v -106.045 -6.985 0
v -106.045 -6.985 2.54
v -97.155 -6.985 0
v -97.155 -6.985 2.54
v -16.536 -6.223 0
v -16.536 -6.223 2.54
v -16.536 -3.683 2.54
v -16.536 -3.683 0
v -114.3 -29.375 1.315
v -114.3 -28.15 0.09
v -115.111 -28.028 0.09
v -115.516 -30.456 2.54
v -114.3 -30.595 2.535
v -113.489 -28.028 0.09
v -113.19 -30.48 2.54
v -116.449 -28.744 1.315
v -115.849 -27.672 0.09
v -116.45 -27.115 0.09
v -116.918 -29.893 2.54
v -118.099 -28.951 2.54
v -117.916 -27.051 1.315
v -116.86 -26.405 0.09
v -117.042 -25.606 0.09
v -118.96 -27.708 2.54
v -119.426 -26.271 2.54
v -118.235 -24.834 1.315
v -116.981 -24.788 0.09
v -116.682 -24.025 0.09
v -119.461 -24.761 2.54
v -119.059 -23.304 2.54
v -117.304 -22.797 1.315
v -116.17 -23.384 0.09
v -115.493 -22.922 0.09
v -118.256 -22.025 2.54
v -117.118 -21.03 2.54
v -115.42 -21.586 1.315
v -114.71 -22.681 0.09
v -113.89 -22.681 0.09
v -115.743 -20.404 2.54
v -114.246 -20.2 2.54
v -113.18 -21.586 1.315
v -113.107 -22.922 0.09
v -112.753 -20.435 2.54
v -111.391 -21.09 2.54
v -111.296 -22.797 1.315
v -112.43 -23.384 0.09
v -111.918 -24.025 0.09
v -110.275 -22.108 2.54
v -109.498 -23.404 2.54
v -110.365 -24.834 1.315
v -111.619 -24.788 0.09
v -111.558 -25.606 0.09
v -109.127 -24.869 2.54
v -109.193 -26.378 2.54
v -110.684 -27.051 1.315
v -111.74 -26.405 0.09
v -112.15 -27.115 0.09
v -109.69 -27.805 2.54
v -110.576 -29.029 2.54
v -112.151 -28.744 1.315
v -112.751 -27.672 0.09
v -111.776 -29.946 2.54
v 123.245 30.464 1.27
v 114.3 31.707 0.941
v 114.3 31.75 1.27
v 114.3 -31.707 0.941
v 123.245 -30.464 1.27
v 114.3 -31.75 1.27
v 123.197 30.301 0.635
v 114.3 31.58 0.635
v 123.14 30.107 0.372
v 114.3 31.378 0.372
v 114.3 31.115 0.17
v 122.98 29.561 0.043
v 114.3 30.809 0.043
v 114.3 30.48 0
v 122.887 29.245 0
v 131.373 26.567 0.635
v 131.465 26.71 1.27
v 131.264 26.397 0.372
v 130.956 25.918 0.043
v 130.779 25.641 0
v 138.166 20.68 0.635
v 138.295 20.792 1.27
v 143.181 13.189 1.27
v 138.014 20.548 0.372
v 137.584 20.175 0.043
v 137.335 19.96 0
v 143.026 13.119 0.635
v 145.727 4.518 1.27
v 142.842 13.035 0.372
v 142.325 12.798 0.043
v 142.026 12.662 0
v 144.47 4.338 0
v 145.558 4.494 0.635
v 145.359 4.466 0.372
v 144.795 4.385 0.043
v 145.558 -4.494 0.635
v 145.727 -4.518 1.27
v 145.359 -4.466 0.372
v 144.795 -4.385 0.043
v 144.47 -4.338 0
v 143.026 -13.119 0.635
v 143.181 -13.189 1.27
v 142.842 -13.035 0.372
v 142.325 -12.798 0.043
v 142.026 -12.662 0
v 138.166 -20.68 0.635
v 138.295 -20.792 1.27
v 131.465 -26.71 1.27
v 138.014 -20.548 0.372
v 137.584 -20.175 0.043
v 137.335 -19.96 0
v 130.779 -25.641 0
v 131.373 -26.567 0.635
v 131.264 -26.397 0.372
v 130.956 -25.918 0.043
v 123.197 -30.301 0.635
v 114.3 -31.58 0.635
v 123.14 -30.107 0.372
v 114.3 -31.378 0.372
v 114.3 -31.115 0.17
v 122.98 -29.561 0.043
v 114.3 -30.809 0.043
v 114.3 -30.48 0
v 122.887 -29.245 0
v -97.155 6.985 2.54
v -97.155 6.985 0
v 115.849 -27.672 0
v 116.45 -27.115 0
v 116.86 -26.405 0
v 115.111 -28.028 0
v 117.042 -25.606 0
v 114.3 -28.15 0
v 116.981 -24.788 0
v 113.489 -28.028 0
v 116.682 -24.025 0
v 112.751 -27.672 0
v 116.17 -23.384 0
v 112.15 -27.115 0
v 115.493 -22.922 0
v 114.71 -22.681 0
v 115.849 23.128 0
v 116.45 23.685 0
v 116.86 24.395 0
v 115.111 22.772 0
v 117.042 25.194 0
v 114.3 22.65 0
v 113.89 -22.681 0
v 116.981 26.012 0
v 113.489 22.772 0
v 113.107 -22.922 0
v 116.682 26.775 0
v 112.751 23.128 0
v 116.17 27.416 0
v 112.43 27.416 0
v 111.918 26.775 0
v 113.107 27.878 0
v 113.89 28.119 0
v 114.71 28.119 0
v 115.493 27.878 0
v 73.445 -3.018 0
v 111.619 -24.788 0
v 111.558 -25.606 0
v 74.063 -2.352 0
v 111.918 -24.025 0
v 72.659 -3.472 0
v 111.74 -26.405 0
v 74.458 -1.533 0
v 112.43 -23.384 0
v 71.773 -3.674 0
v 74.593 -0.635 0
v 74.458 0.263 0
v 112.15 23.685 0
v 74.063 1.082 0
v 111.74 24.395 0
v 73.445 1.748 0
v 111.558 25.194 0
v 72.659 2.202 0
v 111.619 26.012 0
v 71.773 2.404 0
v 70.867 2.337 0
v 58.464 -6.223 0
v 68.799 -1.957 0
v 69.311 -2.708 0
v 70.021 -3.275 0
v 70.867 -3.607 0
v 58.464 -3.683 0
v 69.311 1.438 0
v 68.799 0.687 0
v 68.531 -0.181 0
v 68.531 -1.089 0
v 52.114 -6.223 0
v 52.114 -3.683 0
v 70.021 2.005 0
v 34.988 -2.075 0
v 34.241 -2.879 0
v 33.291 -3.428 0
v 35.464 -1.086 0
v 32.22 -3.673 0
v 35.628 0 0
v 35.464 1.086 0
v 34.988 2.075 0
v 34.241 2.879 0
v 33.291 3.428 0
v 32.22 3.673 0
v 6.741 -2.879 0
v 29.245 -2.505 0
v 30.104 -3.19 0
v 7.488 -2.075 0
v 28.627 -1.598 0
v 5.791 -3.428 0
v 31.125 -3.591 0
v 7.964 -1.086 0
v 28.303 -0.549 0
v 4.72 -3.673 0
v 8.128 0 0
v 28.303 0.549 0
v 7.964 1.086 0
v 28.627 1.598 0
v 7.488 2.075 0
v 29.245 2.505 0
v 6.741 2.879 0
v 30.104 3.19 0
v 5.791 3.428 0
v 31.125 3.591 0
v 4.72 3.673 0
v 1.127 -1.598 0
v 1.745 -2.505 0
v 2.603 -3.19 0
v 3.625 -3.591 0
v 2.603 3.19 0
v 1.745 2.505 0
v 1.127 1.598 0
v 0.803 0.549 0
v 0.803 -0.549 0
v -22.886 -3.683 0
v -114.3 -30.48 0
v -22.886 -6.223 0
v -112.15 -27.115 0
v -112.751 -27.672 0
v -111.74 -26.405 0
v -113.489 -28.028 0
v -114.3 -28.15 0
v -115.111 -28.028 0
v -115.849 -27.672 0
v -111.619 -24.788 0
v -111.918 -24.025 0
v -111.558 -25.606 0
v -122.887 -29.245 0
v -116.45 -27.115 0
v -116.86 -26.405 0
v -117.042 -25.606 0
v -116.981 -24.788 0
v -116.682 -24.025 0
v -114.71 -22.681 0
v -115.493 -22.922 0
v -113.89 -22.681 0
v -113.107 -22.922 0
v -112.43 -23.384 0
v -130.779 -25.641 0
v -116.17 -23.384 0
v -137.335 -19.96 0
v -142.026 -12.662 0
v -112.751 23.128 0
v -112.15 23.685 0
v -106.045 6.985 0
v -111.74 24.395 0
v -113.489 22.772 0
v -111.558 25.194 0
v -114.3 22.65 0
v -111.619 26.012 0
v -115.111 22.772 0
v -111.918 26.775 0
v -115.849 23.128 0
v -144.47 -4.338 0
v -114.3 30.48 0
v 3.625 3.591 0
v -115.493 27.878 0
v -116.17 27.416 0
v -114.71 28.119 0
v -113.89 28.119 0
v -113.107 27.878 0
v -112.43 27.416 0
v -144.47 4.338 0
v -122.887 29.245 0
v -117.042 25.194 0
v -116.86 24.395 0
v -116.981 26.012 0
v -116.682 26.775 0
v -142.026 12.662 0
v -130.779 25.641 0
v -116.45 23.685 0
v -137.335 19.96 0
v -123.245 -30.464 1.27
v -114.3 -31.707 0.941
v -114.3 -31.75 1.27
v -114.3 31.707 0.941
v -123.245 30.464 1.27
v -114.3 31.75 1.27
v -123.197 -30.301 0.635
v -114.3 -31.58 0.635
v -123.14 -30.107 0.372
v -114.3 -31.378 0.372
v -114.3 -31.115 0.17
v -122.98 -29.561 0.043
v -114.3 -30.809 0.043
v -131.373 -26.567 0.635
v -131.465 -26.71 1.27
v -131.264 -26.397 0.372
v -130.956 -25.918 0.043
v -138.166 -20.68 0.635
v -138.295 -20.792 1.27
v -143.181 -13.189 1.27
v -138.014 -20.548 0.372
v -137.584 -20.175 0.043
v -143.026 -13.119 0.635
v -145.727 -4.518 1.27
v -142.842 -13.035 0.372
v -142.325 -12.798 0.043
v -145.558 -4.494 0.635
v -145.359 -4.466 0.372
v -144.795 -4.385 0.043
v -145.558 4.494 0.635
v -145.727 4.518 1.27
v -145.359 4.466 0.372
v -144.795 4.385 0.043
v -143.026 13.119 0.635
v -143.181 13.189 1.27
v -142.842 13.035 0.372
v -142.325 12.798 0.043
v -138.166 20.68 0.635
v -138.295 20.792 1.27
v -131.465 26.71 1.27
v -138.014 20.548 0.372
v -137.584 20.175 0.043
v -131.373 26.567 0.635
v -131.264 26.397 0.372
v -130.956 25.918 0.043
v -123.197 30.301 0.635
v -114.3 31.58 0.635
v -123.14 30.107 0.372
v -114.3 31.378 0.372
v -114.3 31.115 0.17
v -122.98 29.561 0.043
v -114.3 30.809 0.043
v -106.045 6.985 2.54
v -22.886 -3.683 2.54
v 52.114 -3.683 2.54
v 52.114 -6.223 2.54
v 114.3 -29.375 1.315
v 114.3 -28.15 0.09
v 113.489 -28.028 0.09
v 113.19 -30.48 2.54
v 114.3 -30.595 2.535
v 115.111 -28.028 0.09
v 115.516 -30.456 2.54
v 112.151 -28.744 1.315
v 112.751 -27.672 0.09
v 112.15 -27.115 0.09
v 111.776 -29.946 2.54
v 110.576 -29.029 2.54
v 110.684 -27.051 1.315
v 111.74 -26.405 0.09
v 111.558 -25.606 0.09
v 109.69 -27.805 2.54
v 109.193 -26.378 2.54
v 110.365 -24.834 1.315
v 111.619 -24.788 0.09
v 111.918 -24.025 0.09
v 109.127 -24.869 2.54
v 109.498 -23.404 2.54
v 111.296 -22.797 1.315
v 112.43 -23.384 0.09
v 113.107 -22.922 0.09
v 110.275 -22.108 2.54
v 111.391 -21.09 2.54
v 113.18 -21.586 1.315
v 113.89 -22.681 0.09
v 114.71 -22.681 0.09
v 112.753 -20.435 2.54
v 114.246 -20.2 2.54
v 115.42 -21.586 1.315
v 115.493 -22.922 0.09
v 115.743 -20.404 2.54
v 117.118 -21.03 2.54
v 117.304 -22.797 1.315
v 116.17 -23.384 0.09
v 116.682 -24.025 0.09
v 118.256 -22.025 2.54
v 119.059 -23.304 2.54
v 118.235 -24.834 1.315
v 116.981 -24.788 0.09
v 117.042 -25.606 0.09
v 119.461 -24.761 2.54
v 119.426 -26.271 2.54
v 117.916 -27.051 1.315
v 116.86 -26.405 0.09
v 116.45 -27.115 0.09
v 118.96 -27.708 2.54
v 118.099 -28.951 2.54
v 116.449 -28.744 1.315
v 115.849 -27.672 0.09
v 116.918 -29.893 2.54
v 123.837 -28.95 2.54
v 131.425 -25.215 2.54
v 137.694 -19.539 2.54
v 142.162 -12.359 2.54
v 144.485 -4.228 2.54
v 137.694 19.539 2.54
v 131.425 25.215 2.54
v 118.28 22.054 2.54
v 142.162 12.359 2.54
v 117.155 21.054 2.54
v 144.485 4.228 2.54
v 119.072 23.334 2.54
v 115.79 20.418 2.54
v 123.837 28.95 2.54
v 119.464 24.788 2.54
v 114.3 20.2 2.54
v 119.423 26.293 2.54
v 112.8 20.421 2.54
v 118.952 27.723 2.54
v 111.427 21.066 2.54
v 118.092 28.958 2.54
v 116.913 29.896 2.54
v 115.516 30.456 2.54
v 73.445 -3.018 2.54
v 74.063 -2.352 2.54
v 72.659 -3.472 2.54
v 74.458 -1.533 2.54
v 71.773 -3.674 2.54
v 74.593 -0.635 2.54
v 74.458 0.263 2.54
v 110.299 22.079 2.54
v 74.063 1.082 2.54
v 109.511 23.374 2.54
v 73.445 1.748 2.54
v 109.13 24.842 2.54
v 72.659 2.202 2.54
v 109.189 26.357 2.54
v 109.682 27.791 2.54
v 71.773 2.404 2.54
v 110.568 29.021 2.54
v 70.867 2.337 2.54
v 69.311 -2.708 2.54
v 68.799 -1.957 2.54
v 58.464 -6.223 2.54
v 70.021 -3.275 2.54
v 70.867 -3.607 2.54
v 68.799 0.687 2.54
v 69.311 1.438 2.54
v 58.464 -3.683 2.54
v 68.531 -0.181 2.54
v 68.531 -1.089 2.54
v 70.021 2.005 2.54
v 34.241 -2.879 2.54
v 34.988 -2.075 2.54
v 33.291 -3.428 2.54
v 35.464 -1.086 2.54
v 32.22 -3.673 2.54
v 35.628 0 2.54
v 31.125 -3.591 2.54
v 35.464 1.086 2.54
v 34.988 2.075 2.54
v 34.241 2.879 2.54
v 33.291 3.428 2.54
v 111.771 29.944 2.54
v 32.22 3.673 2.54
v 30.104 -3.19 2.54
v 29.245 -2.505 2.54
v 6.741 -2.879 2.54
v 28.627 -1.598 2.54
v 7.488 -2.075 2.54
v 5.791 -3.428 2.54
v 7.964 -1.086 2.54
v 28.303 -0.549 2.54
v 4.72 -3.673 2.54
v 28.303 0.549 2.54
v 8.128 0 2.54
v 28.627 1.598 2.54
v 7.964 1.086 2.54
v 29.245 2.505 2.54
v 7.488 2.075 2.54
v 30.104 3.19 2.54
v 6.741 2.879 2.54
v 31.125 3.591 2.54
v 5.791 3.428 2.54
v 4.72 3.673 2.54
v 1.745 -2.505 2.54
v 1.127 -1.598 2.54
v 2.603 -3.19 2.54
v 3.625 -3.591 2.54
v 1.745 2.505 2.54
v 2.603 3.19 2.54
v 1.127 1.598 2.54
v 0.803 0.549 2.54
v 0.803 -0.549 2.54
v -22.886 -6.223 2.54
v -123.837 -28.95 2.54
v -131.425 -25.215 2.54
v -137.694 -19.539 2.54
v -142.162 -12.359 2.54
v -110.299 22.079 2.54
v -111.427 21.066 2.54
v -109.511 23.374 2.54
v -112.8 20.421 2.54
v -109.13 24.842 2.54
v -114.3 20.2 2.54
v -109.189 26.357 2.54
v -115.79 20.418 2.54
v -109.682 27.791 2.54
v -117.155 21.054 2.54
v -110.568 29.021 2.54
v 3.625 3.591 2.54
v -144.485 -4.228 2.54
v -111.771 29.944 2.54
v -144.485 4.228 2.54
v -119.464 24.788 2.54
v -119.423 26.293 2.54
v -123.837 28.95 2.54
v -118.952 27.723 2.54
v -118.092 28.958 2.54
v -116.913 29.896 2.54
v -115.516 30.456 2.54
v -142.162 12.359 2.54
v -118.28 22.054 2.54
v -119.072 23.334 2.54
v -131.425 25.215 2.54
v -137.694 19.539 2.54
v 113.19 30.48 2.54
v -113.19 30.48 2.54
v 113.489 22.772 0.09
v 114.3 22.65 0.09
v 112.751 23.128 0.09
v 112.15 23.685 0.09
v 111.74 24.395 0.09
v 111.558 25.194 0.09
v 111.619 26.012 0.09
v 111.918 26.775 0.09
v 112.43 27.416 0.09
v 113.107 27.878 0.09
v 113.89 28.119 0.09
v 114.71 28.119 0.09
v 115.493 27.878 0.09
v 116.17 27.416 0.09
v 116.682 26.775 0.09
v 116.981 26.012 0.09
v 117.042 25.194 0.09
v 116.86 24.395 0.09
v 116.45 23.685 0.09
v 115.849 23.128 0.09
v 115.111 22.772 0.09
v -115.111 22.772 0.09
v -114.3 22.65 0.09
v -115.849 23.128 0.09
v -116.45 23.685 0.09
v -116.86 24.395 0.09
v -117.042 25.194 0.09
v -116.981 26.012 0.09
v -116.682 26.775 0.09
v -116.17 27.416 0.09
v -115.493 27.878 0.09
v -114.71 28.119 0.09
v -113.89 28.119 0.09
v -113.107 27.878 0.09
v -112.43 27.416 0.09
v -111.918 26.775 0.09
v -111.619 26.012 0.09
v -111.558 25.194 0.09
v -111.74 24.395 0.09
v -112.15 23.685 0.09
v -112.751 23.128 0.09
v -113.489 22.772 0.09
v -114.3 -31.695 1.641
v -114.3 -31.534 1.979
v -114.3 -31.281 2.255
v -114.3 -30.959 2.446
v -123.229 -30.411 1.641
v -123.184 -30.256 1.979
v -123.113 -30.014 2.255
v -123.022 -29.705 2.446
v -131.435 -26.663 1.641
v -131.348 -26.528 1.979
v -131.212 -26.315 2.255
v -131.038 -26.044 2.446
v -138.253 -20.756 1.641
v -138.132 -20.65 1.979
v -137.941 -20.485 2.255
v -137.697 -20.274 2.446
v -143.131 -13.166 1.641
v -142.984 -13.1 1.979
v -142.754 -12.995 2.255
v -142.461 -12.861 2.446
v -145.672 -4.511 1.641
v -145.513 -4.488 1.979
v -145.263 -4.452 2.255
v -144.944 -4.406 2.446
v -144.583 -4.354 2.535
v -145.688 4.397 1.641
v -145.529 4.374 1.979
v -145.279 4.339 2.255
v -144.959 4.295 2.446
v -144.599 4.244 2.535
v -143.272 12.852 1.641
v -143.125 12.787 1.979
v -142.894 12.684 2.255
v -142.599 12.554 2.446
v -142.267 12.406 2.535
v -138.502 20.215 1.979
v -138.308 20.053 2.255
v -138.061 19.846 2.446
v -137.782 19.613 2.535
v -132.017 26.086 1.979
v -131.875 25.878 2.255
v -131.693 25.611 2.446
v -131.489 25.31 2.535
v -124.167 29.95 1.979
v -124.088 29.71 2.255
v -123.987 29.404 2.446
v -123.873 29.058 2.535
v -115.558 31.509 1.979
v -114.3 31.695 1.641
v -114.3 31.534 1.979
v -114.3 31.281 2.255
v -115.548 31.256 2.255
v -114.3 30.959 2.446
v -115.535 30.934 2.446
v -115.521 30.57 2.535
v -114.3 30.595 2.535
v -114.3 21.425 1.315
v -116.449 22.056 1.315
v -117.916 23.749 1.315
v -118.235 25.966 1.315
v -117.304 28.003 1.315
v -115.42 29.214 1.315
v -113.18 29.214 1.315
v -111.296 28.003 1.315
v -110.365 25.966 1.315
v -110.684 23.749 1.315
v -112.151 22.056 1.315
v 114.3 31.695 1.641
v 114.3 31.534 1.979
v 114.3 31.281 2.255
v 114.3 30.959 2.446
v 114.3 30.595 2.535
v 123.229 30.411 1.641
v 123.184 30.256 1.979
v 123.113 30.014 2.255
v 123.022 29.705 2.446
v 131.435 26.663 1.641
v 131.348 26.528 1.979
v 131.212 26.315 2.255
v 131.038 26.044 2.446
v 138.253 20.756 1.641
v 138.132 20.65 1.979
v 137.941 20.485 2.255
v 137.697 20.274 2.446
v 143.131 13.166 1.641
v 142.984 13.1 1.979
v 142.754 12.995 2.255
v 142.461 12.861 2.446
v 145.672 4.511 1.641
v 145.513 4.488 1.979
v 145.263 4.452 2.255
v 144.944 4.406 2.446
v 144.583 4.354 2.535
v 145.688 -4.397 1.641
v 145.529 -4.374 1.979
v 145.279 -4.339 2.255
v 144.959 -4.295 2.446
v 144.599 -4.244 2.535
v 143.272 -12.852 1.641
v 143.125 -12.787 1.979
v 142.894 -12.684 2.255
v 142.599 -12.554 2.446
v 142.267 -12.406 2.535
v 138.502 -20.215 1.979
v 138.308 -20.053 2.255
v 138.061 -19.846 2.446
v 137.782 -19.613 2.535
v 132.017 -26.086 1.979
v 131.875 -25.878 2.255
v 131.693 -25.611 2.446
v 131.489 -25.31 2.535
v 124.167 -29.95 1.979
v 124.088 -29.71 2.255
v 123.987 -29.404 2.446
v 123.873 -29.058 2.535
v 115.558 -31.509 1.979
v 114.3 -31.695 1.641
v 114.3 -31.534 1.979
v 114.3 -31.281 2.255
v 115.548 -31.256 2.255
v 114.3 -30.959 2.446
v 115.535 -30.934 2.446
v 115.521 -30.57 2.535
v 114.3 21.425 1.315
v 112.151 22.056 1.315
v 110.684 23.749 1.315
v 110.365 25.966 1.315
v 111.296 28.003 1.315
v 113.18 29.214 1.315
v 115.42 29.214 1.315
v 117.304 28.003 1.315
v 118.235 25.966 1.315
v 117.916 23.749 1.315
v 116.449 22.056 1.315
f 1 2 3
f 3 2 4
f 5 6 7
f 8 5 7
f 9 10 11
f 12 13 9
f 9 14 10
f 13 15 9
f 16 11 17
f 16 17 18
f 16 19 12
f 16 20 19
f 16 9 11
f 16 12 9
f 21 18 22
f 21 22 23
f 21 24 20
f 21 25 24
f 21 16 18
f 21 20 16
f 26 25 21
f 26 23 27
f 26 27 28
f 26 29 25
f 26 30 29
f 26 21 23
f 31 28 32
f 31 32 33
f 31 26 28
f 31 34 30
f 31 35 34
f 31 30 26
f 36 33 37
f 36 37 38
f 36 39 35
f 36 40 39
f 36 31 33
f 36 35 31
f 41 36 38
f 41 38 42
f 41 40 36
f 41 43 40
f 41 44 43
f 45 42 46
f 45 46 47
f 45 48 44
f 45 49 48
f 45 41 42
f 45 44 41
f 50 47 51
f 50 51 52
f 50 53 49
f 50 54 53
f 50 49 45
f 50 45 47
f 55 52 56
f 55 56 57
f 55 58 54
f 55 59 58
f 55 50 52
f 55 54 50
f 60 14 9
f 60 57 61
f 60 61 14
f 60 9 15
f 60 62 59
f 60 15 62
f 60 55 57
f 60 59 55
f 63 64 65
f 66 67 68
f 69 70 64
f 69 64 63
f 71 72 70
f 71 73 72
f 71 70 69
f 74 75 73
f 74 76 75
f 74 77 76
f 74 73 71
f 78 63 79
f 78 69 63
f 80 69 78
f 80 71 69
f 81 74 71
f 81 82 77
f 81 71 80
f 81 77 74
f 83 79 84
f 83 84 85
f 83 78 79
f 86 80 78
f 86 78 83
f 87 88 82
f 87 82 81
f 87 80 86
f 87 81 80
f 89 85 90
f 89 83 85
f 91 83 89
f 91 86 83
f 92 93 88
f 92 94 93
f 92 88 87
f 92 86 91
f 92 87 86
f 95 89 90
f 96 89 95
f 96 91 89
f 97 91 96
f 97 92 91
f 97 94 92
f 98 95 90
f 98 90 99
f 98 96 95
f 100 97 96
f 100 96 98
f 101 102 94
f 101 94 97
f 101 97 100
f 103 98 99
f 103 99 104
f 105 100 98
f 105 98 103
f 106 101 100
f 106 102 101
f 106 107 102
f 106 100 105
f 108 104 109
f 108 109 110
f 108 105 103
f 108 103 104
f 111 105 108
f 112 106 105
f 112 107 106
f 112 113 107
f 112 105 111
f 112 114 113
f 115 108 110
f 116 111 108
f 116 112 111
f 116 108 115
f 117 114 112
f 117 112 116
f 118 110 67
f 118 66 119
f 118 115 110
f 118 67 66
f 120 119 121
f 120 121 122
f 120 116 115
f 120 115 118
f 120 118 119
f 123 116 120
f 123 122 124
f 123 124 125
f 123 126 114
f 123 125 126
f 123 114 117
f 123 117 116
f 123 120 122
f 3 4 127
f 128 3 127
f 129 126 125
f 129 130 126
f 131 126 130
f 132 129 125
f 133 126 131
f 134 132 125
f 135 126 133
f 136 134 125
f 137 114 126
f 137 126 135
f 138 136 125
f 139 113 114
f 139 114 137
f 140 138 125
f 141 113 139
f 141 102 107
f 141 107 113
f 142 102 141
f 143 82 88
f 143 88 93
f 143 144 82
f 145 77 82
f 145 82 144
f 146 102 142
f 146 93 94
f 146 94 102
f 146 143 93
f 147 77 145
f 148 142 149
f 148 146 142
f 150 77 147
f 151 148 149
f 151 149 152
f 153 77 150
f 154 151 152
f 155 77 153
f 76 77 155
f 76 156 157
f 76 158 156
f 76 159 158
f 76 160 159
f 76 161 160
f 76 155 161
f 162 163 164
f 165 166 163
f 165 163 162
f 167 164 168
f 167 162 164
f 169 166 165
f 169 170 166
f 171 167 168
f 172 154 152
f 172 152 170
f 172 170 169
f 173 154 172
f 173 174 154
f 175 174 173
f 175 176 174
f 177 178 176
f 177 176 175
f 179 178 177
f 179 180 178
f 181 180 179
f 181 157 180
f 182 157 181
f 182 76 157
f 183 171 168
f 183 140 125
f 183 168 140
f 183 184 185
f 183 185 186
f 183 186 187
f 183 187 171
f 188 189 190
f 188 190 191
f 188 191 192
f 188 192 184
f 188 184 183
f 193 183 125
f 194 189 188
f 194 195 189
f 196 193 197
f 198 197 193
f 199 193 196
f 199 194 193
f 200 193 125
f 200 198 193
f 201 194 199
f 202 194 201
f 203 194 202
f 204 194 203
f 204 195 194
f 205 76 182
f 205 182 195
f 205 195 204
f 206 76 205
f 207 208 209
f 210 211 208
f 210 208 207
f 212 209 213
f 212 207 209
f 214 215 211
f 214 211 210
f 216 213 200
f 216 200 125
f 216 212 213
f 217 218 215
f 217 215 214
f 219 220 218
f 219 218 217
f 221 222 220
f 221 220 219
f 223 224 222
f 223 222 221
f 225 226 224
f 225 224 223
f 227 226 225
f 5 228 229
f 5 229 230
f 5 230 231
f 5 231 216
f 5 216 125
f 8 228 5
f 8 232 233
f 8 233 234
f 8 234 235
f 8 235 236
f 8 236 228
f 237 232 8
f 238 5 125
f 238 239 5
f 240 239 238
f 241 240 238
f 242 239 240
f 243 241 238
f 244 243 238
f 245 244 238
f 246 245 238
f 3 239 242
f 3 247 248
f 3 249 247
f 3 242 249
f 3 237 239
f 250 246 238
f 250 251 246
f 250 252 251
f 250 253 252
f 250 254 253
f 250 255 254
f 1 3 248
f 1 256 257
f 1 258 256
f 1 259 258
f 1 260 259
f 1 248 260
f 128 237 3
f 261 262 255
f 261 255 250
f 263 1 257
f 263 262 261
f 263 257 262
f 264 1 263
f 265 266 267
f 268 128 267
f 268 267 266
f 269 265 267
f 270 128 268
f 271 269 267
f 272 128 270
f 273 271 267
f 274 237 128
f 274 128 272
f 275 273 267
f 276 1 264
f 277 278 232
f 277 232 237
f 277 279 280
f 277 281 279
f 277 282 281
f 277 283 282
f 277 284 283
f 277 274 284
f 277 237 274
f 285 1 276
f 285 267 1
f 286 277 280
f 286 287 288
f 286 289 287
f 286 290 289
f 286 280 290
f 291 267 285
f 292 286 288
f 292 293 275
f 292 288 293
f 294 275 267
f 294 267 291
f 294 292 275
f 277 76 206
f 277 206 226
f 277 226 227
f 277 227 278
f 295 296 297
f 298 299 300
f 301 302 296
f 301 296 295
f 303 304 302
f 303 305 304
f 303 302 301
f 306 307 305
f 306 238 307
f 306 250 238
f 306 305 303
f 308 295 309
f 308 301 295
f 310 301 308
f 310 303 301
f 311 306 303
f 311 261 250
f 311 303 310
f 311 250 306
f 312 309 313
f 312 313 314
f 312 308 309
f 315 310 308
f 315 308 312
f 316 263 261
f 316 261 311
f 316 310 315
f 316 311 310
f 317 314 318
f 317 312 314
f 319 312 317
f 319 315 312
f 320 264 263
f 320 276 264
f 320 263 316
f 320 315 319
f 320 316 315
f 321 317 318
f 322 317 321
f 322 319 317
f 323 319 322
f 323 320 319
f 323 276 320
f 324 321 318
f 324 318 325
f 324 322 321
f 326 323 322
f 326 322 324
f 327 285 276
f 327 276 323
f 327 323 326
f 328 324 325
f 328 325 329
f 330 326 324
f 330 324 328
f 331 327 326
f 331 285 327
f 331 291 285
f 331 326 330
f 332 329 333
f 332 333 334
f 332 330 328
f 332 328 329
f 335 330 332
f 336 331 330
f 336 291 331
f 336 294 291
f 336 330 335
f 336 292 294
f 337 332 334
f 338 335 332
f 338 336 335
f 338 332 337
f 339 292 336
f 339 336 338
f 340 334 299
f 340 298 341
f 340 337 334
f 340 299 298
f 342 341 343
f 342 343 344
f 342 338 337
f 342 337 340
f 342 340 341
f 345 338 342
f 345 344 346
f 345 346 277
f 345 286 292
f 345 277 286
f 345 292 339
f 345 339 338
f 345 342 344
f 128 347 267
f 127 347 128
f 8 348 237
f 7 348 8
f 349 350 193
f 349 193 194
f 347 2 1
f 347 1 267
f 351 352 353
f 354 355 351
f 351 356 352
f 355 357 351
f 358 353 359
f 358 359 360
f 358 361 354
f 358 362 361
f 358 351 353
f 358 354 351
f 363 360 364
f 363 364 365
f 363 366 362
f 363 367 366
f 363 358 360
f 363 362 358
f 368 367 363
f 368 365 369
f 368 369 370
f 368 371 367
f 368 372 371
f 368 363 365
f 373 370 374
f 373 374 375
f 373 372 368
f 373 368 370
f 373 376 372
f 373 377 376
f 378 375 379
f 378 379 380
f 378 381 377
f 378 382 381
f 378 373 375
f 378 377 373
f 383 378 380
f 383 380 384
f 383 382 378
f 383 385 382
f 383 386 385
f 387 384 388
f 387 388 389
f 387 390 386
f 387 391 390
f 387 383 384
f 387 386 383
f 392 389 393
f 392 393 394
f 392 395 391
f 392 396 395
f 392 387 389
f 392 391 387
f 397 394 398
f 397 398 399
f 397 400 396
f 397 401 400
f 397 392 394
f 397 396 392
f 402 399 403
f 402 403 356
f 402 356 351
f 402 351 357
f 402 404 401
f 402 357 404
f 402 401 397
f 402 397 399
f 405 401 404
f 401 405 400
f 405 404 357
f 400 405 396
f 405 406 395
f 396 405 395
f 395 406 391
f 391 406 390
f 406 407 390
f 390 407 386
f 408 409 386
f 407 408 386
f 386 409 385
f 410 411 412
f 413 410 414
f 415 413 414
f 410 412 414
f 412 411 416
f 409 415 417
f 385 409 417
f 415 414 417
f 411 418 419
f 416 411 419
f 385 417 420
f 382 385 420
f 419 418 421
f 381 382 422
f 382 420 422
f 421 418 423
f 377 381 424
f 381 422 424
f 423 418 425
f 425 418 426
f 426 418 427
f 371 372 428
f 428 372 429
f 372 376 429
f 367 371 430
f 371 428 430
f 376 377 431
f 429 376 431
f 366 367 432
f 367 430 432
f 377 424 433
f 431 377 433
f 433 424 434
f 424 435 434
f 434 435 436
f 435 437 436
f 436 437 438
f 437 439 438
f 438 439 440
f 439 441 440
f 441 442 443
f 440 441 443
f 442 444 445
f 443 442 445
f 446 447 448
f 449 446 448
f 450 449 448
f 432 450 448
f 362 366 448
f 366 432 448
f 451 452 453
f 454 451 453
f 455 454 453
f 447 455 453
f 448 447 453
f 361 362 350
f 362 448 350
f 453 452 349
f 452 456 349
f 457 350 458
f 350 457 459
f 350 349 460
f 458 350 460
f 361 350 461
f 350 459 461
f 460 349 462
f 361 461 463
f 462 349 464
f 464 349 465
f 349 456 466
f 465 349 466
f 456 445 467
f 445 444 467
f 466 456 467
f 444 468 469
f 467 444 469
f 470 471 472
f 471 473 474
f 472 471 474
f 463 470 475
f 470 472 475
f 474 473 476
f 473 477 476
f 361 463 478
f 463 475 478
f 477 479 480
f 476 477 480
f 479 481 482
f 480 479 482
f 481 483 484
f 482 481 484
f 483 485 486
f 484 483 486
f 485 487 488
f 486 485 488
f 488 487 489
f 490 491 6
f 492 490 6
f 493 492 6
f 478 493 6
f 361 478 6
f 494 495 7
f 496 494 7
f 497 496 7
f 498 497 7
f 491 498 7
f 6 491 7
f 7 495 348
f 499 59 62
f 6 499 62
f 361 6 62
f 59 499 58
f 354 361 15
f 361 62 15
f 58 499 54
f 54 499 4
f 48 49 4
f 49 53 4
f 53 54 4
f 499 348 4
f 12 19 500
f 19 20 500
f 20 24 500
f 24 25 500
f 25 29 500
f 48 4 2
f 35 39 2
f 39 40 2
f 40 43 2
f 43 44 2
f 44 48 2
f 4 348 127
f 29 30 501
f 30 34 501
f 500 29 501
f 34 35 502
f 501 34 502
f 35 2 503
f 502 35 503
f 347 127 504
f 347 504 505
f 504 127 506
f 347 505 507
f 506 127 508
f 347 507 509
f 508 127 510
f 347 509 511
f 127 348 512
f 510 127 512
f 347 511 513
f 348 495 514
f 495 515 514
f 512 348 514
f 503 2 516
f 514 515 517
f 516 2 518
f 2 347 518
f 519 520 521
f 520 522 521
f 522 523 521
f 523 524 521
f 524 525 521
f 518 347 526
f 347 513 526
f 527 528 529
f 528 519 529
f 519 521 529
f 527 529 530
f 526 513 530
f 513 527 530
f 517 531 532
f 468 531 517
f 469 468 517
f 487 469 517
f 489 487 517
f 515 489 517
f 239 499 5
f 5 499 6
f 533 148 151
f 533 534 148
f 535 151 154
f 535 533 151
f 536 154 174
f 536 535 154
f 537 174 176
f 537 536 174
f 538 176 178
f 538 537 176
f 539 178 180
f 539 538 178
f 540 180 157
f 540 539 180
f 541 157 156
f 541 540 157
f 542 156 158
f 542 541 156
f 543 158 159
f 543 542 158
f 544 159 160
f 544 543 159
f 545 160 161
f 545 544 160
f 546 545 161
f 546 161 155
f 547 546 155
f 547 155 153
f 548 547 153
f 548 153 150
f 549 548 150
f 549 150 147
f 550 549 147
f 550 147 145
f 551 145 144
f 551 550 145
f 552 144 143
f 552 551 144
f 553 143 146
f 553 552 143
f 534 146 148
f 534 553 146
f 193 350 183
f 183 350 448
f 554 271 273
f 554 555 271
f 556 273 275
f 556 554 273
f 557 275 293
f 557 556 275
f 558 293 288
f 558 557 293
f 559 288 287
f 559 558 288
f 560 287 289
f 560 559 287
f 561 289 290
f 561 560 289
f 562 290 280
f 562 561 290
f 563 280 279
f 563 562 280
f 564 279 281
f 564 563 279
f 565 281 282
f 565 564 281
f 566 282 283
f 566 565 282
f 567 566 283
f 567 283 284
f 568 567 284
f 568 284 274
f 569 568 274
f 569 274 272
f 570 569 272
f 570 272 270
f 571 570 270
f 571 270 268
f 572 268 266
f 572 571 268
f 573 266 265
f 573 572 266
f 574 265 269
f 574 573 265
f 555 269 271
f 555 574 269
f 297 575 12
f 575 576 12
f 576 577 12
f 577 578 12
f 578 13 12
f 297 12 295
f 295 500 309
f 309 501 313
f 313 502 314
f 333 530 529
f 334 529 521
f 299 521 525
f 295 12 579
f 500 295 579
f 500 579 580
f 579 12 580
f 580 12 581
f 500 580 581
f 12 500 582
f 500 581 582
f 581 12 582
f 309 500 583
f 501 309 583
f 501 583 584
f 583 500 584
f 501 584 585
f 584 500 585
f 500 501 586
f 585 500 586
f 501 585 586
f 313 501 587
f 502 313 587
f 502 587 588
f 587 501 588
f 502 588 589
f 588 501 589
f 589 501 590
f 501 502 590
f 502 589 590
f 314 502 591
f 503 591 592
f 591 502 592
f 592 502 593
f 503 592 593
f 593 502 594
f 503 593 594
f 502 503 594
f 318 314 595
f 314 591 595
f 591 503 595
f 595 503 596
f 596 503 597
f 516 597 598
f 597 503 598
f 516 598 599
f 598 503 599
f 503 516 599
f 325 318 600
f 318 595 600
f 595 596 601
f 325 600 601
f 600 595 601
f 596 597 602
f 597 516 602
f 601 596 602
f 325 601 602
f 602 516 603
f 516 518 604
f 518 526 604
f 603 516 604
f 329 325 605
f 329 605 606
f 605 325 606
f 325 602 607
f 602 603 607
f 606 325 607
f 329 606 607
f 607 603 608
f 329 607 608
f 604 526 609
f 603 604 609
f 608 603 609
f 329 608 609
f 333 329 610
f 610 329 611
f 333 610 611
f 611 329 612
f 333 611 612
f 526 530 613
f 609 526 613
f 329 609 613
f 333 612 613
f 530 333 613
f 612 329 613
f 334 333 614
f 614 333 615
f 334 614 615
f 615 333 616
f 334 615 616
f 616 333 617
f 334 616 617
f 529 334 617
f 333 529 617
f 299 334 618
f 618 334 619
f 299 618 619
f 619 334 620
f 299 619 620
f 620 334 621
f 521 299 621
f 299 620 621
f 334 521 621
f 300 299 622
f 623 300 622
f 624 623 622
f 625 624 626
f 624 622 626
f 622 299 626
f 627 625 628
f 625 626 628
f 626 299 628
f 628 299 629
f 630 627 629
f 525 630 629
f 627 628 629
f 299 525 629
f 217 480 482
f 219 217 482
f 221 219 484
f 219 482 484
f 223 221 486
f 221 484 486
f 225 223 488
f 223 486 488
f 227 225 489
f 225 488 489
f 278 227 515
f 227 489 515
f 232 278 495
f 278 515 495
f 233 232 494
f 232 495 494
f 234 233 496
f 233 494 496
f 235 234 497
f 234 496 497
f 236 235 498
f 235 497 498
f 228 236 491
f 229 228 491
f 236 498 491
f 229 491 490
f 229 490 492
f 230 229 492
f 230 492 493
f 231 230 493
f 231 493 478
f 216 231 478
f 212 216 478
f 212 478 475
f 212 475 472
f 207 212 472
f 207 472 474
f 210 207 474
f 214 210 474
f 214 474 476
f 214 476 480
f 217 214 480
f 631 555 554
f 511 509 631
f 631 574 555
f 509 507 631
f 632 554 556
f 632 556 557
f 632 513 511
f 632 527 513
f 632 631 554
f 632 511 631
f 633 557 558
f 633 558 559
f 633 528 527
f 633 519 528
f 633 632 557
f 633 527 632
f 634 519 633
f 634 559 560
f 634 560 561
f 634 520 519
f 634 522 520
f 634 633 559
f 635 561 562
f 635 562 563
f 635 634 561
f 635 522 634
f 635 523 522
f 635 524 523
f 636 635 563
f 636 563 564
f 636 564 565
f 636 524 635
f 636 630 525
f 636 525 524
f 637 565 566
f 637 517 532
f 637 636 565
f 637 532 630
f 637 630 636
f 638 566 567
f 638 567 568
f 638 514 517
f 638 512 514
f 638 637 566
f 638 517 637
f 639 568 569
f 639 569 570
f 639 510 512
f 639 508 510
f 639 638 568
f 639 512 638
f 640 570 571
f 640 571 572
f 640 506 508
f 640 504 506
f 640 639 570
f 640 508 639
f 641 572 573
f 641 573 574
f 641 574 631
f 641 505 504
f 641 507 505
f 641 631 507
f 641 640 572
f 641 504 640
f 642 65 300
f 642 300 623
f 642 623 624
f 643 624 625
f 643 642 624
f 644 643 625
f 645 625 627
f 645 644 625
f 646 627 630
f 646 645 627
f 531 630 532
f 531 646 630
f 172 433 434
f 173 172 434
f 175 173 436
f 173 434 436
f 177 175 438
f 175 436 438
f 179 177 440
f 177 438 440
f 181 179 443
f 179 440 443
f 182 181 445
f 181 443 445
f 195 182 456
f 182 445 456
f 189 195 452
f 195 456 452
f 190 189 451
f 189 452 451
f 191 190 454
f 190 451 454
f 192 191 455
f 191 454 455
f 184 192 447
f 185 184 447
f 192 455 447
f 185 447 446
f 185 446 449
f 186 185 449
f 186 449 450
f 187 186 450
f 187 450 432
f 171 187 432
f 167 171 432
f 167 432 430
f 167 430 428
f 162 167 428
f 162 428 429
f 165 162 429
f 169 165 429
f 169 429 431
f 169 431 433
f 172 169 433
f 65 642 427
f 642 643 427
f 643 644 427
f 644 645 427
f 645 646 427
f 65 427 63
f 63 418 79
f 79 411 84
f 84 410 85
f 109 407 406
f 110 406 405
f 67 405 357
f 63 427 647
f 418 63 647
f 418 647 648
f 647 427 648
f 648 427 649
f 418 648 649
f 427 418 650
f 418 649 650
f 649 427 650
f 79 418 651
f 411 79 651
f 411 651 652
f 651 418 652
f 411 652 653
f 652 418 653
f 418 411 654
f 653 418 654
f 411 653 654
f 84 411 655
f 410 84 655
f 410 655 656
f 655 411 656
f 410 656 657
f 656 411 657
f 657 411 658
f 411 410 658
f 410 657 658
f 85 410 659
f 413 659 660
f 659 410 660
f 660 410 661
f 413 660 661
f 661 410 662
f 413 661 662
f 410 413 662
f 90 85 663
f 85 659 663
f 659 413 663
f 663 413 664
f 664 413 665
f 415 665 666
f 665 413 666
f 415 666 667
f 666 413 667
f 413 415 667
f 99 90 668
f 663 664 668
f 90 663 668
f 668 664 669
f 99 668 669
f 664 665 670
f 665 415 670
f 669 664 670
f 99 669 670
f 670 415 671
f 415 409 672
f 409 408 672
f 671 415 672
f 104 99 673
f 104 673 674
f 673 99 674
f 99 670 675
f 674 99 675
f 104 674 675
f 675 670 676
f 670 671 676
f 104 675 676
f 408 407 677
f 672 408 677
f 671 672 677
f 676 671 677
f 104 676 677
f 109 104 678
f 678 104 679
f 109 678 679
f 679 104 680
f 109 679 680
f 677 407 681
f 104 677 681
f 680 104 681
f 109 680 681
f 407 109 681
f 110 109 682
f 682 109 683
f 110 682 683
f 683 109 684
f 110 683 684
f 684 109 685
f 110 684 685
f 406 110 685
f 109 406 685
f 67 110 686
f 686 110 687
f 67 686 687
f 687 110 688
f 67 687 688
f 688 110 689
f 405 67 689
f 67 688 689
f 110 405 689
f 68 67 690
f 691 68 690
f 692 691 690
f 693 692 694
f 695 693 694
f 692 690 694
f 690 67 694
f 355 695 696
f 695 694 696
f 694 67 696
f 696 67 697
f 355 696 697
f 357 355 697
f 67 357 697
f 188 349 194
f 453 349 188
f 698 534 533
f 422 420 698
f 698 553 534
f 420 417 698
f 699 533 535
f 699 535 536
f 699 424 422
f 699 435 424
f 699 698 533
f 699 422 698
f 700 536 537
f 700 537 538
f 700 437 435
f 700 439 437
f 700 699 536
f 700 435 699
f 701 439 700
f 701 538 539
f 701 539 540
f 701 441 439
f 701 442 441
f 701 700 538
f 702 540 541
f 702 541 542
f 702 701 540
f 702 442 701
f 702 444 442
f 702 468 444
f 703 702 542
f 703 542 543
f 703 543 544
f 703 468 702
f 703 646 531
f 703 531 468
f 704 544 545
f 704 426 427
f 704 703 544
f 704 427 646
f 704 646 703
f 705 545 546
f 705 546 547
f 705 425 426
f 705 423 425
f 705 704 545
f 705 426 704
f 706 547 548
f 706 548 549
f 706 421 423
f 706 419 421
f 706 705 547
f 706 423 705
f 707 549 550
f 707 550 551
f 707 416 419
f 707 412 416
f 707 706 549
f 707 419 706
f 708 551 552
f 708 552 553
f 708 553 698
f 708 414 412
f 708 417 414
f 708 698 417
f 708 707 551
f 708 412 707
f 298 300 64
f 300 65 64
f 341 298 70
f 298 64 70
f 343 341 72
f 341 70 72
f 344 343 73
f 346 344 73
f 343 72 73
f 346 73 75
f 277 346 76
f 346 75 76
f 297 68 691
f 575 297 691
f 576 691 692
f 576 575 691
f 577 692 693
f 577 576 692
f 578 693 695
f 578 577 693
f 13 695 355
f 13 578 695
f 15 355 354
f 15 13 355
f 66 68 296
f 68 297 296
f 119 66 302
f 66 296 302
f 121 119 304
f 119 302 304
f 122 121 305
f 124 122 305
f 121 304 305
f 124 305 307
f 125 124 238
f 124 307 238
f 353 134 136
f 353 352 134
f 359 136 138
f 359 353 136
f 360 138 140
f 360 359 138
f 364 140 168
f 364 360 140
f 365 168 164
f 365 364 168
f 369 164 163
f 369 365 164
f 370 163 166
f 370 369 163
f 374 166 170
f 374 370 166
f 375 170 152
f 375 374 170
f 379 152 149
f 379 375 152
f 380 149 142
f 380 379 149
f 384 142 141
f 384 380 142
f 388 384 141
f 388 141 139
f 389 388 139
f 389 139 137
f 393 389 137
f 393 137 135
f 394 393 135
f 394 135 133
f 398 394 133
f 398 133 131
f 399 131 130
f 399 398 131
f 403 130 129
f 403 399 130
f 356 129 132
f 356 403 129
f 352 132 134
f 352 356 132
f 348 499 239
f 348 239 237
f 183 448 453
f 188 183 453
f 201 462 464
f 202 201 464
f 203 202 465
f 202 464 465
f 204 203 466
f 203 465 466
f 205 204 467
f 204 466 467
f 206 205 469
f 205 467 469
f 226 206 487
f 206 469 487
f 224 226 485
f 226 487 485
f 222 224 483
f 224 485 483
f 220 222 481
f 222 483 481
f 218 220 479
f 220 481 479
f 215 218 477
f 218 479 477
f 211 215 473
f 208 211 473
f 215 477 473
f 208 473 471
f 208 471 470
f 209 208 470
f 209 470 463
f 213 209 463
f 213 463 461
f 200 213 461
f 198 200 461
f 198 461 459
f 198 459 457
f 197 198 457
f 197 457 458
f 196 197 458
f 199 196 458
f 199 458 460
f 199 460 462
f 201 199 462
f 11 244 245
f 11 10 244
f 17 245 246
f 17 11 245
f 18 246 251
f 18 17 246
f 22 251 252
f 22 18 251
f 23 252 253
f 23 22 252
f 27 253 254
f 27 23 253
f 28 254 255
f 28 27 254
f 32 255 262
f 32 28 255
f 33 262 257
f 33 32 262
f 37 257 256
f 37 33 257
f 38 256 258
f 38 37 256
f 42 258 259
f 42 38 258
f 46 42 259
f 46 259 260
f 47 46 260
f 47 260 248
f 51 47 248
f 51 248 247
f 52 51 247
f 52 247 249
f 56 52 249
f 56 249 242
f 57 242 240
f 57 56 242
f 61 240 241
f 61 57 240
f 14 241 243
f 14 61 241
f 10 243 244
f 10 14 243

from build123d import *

# Parameters (mm, degrees)
BOSS_EXTRUDE1_DEPTH  = 2.54
SKETCH2_W            = 8.89
SKETCH2_H            = 13.97
CUT_EXTRUDE1_DEPTH   = 7.62
SKETCH3_R            = 3.683
CUT_EXTRUDE2_DEPTH   = 7.62
LPATTERN1_COUNT      = 2
LPATTERN1_PITCH      = 27.5
SKETCH4_R            = 3.048
CUT_EXTRUDE3_DEPTH   = 7.62
SKETCH6_W            = 6.35
SKETCH6_H            = 2.54
CUT_EXTRUDE5_DEPTH   = 2.54
FILLET1_R            = 1.27
LPATTERN4_COUNT      = 2
LPATTERN4_PITCH      = 228.6
LPATTERN4_COUNT_DIR2 = 2
LPATTERN4_PITCH_DIR2 = 50.8
LPATTERN5_COUNT      = 2
LPATTERN5_PITCH      = 75


with BuildPart() as part:
    # Sketch1 → Boss-Extrude1 (new body)
    with BuildSketch(Plane.XY):
        with BuildLine():
            Line((114.3, -31.75), (-114.3, -31.75))
            ThreePointArc((-114.3, -31.75), (-146.05, 0), (-114.3, 31.75))
            Line((-114.3, 31.75), (114.3, 31.75))
            ThreePointArc((114.3, 31.75), (146.05, 0), (114.3, -31.75))
        make_face()
    extrude(amount=BOSS_EXTRUDE1_DEPTH)

    # Sketch2 → Cut-Extrude1 (cut)
    with BuildSketch(Plane.XY.offset(2.54)):
        with Locations((-101.6, 0)):
            Rectangle(SKETCH2_W, SKETCH2_H)
    extrude(amount=-CUT_EXTRUDE1_DEPTH, mode=Mode.SUBTRACT)

    # Sketch3 → Cut-Extrude2 (cut)
    with BuildSketch(Plane.XY.offset(2.54)):
        with Locations((4.445, 0)):
            Circle(SKETCH3_R)
    cut_extrude2 = extrude(amount=-CUT_EXTRUDE2_DEPTH, mode=Mode.SUBTRACT)

    # LPattern1: Cut-Extrude2 ×2
    with Locations(*[(i * LPATTERN1_PITCH, 0, 0) for i in range(1, LPATTERN1_COUNT)]):
        add(cut_extrude2, mode=Mode.SUBTRACT)

    # Sketch4 → Cut-Extrude3 (cut)
    with BuildSketch(Plane.XY.offset(2.54)):
        with Locations((71.545, -0.635)):
            Circle(SKETCH4_R)
    extrude(amount=-CUT_EXTRUDE3_DEPTH, mode=Mode.SUBTRACT)

    # Sketch6 → Cut-Extrude5 (cut)
    with BuildSketch(Plane.XY.offset(2.54)):
        with Locations((55.289, -4.953)):
            Rectangle(SKETCH6_W, SKETCH6_H)
    cut_extrude5 = extrude(amount=-CUT_EXTRUDE5_DEPTH, mode=Mode.SUBTRACT)

    # Fillet1
    fillet1_edges = [part.edges().sort_by_distance(p)[0] for p in [
        (0, -31.75, 2.54),
        (-146.05, 0, 2.54),
        (0, 31.75, 2.54),
        (146.05, 0, 2.54),
        (146.05, 0, 0),
        (0, -31.75, 0),
        (-146.05, 0, 0),
        (0, 31.75, 0),
    ]]
    fillet(fillet1_edges, radius=FILLET1_R - 0.0001)  # a hair under: the kernel refuses the full size

    # Sketch9 → CSK for M5 Flat Head Machine Screw2 (revolve, cut)
    with BuildSketch(Plane(origin=(-114.3, 25.4, 2.54), x_dir=(0, -1, 0), z_dir=(1, 0, 0))):
        Polygon((0, 0), (0, 2.54), (2.75, 2.54), (2.75, 2.45), (5.2, 0), align=None)
    csk_for_m5_flat_head_machine_screw2 = revolve(axis=Axis((-114.3, 25.4, 8.89), (0, 0, -1)), mode=Mode.SUBTRACT)

    # LPattern4: CSK for M5 Flat Head Machine Screw2 2 × 2
    with Locations(*[(i * LPATTERN4_PITCH, -j * LPATTERN4_PITCH_DIR2, 0) for i in range(LPATTERN4_COUNT) for j in range(LPATTERN4_COUNT_DIR2) if (i, j) != (0, 0)]):
        add(csk_for_m5_flat_head_machine_screw2, mode=Mode.SUBTRACT)

    # LPattern5: Cut-Extrude5 ×2
    with Locations(*[(-i * LPATTERN5_PITCH, 0, 0) for i in range(1, LPATTERN5_COUNT)]):
        add(cut_extrude5, mode=Mode.SUBTRACT)


solid = part.part
